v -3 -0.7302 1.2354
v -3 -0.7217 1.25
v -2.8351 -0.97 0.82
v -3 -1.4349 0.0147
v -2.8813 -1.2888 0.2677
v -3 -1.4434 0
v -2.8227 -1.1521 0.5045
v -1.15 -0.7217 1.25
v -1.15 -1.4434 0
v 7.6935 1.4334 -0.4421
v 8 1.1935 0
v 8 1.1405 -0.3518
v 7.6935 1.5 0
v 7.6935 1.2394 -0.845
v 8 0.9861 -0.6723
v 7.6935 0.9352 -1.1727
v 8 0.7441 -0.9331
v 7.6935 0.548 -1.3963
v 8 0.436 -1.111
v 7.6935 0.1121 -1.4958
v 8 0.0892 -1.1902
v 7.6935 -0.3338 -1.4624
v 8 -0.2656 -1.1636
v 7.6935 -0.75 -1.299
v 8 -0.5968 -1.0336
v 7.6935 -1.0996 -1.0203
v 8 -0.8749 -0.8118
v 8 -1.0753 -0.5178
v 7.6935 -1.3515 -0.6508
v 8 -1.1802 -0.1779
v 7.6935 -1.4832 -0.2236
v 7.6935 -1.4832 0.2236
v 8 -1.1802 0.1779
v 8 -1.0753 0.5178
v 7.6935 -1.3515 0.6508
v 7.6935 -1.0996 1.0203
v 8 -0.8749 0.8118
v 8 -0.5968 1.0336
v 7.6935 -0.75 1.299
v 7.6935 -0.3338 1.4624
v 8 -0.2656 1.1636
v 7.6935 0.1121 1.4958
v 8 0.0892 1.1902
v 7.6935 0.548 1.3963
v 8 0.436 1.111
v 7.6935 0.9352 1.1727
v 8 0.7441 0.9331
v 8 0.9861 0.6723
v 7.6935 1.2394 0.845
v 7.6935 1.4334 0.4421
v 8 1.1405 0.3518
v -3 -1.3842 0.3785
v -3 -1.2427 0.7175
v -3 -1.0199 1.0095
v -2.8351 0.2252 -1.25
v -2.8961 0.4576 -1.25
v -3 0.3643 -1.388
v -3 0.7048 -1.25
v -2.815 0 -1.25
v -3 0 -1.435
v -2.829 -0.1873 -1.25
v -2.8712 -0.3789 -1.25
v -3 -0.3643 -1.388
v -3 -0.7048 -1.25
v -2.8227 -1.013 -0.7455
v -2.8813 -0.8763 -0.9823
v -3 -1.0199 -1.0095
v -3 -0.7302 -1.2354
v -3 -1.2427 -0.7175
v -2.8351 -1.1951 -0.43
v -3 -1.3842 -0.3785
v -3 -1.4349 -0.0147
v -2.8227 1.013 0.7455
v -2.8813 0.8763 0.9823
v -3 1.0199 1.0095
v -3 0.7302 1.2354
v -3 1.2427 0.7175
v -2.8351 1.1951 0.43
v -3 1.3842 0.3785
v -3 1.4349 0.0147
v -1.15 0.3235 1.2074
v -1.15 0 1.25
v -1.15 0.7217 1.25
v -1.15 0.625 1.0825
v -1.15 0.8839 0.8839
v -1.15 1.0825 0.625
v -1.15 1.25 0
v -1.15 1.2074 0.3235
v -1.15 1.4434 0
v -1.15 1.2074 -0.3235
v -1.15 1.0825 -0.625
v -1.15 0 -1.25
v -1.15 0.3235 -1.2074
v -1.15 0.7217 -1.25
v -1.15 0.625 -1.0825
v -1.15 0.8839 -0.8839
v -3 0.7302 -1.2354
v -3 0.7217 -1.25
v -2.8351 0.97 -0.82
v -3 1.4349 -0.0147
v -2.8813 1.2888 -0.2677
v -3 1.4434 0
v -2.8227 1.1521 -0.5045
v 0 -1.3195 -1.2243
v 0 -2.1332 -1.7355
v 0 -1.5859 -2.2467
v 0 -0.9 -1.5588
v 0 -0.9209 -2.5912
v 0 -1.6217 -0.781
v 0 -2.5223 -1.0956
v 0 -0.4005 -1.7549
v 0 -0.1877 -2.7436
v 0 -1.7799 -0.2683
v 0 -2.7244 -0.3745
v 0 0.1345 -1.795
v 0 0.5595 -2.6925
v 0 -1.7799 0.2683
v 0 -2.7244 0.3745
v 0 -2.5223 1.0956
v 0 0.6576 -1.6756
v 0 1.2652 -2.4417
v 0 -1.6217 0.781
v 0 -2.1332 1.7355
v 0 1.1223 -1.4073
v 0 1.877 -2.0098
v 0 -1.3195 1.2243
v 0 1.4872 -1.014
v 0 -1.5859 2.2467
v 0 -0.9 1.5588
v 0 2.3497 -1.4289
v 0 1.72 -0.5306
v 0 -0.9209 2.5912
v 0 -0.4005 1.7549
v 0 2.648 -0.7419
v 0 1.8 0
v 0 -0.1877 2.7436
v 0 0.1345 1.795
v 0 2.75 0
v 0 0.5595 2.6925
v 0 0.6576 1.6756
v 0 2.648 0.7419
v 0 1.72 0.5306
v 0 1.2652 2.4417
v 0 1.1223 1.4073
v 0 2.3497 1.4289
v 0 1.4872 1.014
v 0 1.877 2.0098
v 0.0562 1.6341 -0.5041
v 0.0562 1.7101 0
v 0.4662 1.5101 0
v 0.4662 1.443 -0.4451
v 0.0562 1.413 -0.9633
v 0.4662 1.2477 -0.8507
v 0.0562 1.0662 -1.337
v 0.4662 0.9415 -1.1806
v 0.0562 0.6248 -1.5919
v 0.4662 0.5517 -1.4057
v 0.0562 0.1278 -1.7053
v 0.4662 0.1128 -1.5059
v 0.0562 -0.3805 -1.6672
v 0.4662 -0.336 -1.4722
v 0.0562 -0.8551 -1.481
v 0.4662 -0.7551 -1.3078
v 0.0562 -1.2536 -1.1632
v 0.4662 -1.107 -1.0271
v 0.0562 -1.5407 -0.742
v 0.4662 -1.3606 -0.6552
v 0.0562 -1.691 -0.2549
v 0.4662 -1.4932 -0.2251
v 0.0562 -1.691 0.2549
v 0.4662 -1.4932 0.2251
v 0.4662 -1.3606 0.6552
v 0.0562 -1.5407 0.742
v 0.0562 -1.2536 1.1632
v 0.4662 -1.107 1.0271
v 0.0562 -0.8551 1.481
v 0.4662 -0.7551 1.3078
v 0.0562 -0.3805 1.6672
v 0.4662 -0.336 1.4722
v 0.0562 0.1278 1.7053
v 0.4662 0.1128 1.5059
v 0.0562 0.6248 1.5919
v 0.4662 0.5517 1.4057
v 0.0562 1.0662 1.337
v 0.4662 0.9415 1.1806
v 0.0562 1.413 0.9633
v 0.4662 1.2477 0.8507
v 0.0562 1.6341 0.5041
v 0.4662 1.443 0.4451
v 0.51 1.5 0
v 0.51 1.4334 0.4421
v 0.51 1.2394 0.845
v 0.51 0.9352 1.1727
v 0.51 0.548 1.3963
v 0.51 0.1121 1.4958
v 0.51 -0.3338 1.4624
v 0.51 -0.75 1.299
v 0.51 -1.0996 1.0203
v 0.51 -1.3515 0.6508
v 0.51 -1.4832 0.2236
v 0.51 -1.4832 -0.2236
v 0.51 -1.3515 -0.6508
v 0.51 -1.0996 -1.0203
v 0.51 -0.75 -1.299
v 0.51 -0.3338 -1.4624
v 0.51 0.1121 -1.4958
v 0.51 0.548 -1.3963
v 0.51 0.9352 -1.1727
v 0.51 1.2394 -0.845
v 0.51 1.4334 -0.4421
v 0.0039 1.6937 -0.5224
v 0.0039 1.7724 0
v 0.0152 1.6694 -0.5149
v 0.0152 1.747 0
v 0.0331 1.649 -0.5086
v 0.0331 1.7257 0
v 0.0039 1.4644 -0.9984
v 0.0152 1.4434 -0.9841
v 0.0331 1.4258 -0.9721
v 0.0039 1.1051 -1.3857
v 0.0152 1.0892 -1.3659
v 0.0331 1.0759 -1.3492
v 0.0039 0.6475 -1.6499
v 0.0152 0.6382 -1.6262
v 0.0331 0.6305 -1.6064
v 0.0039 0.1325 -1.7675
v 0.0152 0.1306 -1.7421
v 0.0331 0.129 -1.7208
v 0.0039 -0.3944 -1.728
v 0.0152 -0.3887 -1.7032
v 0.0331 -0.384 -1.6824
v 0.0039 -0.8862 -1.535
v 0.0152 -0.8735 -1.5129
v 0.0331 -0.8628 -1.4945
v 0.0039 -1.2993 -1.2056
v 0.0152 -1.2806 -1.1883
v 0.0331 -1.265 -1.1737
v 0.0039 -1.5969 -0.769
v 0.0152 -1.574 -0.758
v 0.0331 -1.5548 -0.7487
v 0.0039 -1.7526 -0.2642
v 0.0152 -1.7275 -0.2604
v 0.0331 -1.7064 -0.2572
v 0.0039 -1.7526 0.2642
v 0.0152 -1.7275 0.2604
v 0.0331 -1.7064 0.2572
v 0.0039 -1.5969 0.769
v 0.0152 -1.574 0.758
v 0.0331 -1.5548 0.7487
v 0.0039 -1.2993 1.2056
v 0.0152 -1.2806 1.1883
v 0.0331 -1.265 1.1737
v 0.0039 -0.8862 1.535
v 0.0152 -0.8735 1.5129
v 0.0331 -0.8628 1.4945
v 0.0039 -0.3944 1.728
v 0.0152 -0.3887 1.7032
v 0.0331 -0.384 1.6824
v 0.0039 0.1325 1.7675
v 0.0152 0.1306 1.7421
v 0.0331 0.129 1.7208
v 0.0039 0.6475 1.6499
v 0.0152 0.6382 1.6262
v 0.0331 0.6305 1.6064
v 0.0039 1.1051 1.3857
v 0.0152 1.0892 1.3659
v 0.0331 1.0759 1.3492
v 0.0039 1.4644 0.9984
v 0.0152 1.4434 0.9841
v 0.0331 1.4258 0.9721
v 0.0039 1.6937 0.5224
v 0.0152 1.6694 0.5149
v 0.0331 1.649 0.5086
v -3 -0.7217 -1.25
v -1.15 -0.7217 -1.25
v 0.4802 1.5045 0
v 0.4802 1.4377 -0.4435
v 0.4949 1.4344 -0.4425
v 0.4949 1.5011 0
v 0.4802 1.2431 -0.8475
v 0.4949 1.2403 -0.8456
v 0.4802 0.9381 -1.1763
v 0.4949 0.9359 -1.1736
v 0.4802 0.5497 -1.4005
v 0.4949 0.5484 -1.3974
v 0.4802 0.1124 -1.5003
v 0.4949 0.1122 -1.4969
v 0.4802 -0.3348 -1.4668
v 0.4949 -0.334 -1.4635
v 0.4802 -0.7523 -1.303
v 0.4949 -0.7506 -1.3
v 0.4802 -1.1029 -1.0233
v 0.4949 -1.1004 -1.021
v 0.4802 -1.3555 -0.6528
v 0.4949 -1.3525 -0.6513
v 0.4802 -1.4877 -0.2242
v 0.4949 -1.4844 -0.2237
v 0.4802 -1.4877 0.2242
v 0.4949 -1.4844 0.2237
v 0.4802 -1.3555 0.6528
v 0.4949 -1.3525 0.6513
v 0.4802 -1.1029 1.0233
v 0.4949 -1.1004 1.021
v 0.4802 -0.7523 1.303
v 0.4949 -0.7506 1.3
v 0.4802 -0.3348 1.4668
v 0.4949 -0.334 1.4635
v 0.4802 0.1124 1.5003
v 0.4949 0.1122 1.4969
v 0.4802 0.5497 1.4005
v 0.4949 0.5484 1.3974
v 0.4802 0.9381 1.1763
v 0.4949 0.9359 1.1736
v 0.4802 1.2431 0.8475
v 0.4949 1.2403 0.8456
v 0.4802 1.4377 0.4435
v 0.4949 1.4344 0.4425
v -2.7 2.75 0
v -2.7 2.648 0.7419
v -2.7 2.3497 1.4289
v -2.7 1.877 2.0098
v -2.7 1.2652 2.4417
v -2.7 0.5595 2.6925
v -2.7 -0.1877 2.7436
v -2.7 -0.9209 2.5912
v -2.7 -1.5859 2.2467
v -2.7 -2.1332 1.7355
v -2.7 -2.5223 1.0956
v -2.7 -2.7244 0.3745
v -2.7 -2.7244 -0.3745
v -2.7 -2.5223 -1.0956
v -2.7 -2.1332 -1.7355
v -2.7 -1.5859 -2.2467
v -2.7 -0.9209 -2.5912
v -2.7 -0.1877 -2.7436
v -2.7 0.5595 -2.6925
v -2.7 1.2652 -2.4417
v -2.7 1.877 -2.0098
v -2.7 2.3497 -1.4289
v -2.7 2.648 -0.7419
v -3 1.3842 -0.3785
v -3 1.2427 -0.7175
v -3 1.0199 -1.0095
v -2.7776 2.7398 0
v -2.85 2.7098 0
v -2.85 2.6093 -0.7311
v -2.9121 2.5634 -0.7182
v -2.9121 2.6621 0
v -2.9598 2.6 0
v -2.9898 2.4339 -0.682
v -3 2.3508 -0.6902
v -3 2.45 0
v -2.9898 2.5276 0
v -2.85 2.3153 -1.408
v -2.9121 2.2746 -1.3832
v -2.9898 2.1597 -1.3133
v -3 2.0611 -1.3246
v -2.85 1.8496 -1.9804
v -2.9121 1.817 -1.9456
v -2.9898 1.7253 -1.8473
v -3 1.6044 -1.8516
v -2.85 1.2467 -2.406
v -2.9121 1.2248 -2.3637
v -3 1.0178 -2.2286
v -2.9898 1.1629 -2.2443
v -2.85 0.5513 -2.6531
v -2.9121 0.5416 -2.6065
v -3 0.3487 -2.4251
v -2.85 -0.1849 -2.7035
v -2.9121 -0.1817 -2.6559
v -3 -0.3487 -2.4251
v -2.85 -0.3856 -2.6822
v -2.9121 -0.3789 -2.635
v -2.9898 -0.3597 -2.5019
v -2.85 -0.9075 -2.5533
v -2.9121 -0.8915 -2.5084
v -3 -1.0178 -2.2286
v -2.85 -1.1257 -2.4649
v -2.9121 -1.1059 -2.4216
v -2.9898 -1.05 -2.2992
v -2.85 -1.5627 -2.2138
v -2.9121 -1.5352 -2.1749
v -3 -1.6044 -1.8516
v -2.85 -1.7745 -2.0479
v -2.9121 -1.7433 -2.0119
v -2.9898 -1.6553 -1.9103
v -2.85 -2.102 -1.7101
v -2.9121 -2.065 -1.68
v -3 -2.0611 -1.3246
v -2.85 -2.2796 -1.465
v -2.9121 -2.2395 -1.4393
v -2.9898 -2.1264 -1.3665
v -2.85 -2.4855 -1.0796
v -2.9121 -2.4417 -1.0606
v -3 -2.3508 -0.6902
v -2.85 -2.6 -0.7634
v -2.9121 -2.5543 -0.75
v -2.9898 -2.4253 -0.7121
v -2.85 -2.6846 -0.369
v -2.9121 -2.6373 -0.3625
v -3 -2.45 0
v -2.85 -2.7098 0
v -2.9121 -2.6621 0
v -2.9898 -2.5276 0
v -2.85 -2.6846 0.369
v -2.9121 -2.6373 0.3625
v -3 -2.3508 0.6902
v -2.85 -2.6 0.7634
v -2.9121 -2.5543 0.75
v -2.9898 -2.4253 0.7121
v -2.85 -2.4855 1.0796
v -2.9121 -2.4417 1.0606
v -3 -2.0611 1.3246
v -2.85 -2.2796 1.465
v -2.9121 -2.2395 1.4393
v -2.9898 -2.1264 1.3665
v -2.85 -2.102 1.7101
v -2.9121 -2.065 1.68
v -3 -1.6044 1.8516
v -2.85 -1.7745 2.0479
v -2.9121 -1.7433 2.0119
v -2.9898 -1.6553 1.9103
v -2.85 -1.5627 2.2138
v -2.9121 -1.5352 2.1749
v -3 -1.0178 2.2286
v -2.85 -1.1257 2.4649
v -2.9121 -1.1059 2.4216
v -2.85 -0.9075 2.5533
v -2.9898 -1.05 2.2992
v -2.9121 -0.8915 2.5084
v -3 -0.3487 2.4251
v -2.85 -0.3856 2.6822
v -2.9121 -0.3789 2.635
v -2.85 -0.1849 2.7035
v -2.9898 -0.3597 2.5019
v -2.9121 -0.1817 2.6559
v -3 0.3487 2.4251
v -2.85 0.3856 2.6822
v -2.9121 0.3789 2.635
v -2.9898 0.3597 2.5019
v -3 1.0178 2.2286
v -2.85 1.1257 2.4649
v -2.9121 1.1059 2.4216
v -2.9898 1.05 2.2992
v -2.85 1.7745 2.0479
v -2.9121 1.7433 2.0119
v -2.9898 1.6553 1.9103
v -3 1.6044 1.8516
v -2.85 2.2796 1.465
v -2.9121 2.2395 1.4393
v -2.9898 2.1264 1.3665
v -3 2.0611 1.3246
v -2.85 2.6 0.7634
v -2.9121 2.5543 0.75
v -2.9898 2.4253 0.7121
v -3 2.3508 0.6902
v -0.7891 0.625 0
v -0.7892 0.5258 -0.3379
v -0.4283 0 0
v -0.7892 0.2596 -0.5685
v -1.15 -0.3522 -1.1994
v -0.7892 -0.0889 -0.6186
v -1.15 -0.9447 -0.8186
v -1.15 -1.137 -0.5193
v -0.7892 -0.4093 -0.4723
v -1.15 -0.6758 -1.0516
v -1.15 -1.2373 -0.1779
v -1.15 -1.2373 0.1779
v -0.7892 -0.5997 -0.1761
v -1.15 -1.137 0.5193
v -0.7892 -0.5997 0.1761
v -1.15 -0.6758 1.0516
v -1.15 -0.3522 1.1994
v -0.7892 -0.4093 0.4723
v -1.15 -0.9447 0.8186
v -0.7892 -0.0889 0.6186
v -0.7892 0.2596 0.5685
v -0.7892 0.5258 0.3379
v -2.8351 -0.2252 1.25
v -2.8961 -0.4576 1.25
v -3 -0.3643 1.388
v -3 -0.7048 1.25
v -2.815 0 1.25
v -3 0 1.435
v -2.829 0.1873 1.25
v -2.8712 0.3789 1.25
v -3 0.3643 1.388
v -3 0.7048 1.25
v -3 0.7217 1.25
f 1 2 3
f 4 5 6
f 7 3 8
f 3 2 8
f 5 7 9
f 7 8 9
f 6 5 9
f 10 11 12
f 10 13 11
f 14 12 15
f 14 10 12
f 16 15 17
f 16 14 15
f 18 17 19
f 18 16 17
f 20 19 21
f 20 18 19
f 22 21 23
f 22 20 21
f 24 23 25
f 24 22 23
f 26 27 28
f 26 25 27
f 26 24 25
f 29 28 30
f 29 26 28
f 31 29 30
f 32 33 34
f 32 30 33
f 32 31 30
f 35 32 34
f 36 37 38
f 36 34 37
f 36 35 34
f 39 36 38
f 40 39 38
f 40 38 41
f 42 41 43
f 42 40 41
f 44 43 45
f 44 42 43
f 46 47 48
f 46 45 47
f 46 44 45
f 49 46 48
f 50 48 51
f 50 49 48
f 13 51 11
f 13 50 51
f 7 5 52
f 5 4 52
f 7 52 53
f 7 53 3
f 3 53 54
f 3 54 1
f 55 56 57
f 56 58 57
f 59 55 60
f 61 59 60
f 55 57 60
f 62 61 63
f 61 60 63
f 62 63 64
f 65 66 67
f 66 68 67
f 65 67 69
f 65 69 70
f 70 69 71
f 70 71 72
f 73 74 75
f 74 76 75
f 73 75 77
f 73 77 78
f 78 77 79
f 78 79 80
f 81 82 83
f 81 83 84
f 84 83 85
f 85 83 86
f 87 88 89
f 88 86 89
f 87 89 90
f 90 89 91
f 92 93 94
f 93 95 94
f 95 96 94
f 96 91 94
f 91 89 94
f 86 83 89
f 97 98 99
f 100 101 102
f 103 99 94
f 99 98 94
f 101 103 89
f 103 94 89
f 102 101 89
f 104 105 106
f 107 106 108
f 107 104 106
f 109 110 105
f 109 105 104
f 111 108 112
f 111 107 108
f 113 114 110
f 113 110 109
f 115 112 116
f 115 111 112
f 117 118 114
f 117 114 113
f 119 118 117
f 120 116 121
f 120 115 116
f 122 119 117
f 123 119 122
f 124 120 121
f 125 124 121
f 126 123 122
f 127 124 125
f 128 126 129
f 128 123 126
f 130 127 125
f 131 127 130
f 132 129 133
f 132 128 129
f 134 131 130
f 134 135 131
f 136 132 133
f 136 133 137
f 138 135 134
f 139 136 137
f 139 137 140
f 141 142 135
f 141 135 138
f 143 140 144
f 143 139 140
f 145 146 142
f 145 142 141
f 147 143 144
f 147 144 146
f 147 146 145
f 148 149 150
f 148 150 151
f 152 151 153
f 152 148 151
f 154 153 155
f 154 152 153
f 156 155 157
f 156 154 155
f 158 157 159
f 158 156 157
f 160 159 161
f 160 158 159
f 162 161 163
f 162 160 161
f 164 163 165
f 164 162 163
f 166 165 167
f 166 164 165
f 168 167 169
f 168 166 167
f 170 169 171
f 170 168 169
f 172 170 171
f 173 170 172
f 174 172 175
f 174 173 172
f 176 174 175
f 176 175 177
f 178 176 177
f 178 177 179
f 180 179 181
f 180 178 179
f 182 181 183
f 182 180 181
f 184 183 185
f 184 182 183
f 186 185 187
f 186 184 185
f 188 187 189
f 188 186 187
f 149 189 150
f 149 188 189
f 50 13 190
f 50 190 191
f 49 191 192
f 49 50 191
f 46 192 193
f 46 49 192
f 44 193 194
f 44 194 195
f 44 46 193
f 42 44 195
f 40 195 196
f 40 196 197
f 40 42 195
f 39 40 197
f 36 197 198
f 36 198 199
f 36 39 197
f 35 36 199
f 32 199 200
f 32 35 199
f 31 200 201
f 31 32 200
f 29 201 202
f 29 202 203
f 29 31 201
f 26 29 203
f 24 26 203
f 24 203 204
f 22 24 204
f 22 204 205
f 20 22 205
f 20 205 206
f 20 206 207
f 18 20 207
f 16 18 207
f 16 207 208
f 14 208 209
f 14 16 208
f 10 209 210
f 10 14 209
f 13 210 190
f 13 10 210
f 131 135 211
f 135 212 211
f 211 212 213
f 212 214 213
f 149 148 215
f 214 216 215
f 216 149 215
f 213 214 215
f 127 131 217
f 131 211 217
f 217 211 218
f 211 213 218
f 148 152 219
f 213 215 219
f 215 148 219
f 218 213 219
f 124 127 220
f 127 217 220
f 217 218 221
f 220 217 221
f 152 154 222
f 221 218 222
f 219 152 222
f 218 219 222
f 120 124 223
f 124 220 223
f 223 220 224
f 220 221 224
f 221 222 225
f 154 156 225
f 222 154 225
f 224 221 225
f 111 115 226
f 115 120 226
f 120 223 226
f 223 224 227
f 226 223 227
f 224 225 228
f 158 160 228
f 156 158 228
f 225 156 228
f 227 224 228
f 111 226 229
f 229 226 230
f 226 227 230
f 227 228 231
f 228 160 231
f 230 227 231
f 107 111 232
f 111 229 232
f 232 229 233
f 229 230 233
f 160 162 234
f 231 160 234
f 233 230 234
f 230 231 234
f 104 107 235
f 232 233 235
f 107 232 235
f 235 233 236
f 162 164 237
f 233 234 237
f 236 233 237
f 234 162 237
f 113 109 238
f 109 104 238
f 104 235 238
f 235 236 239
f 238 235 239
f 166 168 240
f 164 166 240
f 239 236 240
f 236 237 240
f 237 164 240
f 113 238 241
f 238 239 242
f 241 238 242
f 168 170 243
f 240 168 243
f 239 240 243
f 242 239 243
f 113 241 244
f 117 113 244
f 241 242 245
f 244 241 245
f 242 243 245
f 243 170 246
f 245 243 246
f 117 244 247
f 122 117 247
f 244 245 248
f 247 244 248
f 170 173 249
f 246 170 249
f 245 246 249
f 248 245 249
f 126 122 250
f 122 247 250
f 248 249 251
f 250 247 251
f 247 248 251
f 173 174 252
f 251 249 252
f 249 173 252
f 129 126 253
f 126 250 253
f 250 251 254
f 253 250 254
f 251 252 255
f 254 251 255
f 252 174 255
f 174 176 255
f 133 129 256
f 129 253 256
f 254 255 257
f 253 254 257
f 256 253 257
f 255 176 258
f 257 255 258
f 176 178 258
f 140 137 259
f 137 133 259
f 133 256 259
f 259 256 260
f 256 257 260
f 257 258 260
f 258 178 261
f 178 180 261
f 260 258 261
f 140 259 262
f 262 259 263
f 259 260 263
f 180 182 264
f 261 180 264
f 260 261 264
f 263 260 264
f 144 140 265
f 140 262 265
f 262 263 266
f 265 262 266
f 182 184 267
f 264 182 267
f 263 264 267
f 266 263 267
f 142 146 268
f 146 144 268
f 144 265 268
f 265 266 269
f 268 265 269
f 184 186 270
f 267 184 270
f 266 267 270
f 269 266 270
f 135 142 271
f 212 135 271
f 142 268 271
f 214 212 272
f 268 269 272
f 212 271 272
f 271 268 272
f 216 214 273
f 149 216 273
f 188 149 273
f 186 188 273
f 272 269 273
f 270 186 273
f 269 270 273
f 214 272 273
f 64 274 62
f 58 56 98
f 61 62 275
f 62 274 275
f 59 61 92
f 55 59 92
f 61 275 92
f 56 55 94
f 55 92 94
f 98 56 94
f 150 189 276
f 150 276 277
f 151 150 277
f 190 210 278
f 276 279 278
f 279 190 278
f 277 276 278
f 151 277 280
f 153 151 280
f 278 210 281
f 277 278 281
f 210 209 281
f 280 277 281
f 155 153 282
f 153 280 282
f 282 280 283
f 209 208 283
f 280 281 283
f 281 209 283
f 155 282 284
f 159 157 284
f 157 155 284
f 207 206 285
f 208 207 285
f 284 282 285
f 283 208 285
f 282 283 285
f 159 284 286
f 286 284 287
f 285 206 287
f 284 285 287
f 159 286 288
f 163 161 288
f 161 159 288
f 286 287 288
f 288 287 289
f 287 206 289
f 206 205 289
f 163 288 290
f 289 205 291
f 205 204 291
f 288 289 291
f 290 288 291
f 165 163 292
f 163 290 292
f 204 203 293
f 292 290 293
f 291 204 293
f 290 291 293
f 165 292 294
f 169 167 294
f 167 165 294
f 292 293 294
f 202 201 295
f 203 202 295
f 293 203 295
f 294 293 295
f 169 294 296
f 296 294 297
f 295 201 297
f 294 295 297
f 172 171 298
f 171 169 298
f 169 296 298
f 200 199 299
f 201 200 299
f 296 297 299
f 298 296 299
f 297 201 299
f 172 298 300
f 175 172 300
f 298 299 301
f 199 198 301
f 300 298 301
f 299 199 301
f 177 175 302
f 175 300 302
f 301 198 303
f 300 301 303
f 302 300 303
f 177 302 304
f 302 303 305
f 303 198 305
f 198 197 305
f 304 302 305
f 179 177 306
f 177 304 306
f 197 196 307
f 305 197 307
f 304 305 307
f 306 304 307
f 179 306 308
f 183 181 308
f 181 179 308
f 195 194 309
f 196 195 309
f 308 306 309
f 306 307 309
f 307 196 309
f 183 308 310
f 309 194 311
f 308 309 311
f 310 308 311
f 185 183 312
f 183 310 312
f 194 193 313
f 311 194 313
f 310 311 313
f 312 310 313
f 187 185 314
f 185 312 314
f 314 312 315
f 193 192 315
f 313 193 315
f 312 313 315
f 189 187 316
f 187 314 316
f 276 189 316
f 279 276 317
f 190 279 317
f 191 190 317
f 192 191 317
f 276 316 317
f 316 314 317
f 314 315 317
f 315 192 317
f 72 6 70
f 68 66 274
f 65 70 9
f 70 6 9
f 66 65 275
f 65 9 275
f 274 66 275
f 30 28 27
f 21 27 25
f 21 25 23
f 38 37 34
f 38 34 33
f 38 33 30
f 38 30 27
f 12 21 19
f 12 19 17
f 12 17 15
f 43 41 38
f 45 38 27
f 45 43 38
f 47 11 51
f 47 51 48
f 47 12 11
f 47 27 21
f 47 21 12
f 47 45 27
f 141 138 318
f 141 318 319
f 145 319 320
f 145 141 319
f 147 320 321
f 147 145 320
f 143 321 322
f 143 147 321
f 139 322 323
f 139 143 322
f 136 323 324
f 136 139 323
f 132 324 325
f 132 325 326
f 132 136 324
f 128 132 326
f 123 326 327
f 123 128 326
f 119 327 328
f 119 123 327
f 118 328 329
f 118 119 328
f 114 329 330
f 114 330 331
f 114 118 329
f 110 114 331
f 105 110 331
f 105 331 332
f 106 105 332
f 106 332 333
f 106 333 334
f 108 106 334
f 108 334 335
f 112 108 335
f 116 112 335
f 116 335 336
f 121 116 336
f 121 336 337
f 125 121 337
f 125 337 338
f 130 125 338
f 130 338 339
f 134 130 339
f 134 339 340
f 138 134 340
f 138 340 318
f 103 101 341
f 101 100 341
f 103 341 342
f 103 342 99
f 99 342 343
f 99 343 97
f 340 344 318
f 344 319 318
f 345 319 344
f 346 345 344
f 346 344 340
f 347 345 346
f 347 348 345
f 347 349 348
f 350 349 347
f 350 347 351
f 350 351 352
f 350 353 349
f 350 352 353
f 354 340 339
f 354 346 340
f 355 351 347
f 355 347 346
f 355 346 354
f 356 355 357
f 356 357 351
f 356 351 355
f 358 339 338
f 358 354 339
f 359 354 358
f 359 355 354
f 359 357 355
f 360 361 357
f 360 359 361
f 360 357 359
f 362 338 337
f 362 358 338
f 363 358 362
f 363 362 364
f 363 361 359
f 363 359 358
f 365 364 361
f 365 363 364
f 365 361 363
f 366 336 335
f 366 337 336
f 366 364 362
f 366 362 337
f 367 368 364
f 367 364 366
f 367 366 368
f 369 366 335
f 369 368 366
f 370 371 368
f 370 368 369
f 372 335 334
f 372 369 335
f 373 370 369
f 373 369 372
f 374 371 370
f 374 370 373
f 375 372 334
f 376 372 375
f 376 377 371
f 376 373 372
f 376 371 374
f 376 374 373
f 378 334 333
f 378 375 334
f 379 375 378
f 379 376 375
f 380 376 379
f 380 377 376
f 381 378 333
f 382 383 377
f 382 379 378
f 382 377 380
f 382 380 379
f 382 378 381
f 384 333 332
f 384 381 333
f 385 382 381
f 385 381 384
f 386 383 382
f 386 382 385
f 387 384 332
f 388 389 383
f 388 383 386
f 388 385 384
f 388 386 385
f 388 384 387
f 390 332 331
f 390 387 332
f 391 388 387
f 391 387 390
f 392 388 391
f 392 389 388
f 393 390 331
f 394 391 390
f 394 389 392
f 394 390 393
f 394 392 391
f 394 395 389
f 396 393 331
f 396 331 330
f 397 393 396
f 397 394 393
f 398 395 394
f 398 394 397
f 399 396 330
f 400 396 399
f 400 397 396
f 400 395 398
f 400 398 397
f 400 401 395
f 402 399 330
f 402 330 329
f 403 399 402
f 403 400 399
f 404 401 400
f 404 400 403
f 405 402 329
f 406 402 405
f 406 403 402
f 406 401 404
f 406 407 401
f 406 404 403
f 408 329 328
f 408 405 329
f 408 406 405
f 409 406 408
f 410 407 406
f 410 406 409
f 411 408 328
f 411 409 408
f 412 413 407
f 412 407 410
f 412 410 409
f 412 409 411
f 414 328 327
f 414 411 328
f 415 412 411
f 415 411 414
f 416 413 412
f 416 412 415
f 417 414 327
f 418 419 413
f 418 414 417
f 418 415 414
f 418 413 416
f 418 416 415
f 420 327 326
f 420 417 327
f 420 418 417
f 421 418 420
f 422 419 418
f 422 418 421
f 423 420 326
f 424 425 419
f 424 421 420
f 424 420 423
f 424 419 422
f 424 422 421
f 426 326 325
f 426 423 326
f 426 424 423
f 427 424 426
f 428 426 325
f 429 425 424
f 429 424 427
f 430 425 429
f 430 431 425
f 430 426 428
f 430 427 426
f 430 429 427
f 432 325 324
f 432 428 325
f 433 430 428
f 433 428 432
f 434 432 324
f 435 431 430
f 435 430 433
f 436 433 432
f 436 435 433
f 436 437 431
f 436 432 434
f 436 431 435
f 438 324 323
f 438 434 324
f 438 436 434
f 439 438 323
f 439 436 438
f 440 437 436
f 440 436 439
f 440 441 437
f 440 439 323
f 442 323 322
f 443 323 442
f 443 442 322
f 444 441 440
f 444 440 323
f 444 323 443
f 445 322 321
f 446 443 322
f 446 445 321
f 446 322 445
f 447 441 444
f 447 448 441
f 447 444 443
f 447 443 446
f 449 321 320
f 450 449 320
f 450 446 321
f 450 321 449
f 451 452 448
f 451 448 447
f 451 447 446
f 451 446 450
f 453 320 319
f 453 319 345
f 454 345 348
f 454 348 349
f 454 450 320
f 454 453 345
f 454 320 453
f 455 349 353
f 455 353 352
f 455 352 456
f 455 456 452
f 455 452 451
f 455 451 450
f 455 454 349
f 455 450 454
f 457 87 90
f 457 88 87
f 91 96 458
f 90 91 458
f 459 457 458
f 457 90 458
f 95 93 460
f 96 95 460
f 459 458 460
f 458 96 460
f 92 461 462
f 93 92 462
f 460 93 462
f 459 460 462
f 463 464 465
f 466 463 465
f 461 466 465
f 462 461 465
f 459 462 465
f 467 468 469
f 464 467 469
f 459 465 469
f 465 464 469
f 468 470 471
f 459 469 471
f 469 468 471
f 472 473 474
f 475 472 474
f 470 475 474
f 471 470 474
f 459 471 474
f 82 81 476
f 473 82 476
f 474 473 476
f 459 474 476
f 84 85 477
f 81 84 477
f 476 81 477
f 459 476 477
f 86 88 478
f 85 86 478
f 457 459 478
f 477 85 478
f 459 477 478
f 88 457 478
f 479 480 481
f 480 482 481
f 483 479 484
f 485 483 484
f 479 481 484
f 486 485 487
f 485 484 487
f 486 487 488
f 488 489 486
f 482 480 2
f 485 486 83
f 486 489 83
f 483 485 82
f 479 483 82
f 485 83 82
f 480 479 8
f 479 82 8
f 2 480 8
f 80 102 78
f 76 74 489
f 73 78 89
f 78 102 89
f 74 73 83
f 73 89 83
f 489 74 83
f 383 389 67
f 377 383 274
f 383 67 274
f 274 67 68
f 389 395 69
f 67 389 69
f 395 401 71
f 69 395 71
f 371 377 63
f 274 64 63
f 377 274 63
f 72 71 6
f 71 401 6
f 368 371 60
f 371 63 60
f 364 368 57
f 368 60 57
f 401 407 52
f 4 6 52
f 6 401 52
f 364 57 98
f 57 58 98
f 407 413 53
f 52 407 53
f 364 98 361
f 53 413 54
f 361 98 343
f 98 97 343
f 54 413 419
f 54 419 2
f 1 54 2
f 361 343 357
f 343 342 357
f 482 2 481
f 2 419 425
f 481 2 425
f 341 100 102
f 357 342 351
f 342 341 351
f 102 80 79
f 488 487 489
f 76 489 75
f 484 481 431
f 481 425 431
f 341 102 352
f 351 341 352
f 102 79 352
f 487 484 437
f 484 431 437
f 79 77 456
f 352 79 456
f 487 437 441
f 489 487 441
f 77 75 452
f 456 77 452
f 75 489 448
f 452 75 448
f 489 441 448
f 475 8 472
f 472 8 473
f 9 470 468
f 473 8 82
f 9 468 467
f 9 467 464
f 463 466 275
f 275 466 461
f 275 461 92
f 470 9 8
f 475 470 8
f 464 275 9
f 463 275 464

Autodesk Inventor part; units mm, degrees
sketch "Skizze_2" plane through (0, 0, 0) normal (0, 0, 1) x (1, 0, 0)
  line L0 (8, 0) -> (-6, 0)
  line L1 (-0.4283, 0) -> (-1.15, 1.25)
  line L2 (-1.15, 1.25) -> (-2.815, 1.25)
  line L3 (-2.815, 1.25) -> (-3, 1.435)
  line L4 (-3, 1.435) -> (-3, 2.45)
  arc A0 (-2.7, 2.75) -> (-3, 2.45) centre (-2.7, 2.45) ccw
  line L5 (-2.7, 2.75) -> (0, 2.75)
  line L6 (0, 2.75) -> (0, 1.8)
  arc A1 (0, 1.8) -> (0.0562, 1.7101) centre (0.1, 1.8) ccw
  line L7 (0.0562, 1.7101) -> (0.4662, 1.5101)
  arc A2 (0.4662, 1.5101) -> (0.51, 1.5) centre (0.51, 1.6) ccw
  line L8 (0.51, 1.5) -> (7.6935, 1.5)
  line L9 (7.6935, 1.5) -> (8, 1.1935)
  line L10 (8, 1.1935) -> (8, 0)
  line L11 (8, 0) -> (-0.4283, 0)
revolve "Revolution1" add sketch "Skizze_2" angle 360 about axis through (8, 0, 0) along (1, 0, 0)
thread "Thread1" size "M3x0.5" class "6g" standard "ISO Metric profile" length 6.1935
sketch "Skizze_1" plane through (-1.15, 0, 0) normal (1, 0, 0) x (0, 0, -1)
  line L0 (-1.25, -0.7217) -> (0, -1.4434)
  line L1 (0, -1.4434) -> (1.25, -0.7217)
  line L2 (1.25, -0.7217) -> (1.25, 0.7217)
  line L3 (1.25, 0.7217) -> (0, 1.4434)
  line L4 (0, 1.4434) -> (-1.25, 0.7217)
  line L5 (-1.25, 0.7217) -> (-1.25, -0.7217)
extrude "Extrusion1" cut sketch "Skizze_1" against normal blind 2.6
ref_plane "IP1_XY" through (0, 0, 0) normal (1, 0, 0) x (0, 0, -1)
ref_plane "IP1_YZ" through (0, 0, 0) normal (0, 0, -1) x (0, 1, 0)
ref_plane "IP1_ZX" through (0, 0, 0) normal (0, 1, 0) x (1, 0, 0)
ref_plane "IP2_XY" through (-3, 0, 0) normal (1, 0, 0) x (0, 0, -1)
ref_plane "IP2_YZ" through (-3, 0, 0) normal (0, 0, -1) x (0, 1, 0)
ref_plane "IP2_ZX" through (-3, 0, 0) normal (0, 1, 0) x (1, 0, 0)
ref_plane "IP3_XY" through (8, 0, 0) normal (1, 0, 0) x (0, 0, -1)
ref_plane "IP3_YZ" through (8, 0, 0) normal (0, 0, -1) x (0, 1, 0)
ref_plane "IP3_ZX" through (8, 0, 0) normal (0, 1, 0) x (1, 0, 0)
properties part number "M3x8_p3"
